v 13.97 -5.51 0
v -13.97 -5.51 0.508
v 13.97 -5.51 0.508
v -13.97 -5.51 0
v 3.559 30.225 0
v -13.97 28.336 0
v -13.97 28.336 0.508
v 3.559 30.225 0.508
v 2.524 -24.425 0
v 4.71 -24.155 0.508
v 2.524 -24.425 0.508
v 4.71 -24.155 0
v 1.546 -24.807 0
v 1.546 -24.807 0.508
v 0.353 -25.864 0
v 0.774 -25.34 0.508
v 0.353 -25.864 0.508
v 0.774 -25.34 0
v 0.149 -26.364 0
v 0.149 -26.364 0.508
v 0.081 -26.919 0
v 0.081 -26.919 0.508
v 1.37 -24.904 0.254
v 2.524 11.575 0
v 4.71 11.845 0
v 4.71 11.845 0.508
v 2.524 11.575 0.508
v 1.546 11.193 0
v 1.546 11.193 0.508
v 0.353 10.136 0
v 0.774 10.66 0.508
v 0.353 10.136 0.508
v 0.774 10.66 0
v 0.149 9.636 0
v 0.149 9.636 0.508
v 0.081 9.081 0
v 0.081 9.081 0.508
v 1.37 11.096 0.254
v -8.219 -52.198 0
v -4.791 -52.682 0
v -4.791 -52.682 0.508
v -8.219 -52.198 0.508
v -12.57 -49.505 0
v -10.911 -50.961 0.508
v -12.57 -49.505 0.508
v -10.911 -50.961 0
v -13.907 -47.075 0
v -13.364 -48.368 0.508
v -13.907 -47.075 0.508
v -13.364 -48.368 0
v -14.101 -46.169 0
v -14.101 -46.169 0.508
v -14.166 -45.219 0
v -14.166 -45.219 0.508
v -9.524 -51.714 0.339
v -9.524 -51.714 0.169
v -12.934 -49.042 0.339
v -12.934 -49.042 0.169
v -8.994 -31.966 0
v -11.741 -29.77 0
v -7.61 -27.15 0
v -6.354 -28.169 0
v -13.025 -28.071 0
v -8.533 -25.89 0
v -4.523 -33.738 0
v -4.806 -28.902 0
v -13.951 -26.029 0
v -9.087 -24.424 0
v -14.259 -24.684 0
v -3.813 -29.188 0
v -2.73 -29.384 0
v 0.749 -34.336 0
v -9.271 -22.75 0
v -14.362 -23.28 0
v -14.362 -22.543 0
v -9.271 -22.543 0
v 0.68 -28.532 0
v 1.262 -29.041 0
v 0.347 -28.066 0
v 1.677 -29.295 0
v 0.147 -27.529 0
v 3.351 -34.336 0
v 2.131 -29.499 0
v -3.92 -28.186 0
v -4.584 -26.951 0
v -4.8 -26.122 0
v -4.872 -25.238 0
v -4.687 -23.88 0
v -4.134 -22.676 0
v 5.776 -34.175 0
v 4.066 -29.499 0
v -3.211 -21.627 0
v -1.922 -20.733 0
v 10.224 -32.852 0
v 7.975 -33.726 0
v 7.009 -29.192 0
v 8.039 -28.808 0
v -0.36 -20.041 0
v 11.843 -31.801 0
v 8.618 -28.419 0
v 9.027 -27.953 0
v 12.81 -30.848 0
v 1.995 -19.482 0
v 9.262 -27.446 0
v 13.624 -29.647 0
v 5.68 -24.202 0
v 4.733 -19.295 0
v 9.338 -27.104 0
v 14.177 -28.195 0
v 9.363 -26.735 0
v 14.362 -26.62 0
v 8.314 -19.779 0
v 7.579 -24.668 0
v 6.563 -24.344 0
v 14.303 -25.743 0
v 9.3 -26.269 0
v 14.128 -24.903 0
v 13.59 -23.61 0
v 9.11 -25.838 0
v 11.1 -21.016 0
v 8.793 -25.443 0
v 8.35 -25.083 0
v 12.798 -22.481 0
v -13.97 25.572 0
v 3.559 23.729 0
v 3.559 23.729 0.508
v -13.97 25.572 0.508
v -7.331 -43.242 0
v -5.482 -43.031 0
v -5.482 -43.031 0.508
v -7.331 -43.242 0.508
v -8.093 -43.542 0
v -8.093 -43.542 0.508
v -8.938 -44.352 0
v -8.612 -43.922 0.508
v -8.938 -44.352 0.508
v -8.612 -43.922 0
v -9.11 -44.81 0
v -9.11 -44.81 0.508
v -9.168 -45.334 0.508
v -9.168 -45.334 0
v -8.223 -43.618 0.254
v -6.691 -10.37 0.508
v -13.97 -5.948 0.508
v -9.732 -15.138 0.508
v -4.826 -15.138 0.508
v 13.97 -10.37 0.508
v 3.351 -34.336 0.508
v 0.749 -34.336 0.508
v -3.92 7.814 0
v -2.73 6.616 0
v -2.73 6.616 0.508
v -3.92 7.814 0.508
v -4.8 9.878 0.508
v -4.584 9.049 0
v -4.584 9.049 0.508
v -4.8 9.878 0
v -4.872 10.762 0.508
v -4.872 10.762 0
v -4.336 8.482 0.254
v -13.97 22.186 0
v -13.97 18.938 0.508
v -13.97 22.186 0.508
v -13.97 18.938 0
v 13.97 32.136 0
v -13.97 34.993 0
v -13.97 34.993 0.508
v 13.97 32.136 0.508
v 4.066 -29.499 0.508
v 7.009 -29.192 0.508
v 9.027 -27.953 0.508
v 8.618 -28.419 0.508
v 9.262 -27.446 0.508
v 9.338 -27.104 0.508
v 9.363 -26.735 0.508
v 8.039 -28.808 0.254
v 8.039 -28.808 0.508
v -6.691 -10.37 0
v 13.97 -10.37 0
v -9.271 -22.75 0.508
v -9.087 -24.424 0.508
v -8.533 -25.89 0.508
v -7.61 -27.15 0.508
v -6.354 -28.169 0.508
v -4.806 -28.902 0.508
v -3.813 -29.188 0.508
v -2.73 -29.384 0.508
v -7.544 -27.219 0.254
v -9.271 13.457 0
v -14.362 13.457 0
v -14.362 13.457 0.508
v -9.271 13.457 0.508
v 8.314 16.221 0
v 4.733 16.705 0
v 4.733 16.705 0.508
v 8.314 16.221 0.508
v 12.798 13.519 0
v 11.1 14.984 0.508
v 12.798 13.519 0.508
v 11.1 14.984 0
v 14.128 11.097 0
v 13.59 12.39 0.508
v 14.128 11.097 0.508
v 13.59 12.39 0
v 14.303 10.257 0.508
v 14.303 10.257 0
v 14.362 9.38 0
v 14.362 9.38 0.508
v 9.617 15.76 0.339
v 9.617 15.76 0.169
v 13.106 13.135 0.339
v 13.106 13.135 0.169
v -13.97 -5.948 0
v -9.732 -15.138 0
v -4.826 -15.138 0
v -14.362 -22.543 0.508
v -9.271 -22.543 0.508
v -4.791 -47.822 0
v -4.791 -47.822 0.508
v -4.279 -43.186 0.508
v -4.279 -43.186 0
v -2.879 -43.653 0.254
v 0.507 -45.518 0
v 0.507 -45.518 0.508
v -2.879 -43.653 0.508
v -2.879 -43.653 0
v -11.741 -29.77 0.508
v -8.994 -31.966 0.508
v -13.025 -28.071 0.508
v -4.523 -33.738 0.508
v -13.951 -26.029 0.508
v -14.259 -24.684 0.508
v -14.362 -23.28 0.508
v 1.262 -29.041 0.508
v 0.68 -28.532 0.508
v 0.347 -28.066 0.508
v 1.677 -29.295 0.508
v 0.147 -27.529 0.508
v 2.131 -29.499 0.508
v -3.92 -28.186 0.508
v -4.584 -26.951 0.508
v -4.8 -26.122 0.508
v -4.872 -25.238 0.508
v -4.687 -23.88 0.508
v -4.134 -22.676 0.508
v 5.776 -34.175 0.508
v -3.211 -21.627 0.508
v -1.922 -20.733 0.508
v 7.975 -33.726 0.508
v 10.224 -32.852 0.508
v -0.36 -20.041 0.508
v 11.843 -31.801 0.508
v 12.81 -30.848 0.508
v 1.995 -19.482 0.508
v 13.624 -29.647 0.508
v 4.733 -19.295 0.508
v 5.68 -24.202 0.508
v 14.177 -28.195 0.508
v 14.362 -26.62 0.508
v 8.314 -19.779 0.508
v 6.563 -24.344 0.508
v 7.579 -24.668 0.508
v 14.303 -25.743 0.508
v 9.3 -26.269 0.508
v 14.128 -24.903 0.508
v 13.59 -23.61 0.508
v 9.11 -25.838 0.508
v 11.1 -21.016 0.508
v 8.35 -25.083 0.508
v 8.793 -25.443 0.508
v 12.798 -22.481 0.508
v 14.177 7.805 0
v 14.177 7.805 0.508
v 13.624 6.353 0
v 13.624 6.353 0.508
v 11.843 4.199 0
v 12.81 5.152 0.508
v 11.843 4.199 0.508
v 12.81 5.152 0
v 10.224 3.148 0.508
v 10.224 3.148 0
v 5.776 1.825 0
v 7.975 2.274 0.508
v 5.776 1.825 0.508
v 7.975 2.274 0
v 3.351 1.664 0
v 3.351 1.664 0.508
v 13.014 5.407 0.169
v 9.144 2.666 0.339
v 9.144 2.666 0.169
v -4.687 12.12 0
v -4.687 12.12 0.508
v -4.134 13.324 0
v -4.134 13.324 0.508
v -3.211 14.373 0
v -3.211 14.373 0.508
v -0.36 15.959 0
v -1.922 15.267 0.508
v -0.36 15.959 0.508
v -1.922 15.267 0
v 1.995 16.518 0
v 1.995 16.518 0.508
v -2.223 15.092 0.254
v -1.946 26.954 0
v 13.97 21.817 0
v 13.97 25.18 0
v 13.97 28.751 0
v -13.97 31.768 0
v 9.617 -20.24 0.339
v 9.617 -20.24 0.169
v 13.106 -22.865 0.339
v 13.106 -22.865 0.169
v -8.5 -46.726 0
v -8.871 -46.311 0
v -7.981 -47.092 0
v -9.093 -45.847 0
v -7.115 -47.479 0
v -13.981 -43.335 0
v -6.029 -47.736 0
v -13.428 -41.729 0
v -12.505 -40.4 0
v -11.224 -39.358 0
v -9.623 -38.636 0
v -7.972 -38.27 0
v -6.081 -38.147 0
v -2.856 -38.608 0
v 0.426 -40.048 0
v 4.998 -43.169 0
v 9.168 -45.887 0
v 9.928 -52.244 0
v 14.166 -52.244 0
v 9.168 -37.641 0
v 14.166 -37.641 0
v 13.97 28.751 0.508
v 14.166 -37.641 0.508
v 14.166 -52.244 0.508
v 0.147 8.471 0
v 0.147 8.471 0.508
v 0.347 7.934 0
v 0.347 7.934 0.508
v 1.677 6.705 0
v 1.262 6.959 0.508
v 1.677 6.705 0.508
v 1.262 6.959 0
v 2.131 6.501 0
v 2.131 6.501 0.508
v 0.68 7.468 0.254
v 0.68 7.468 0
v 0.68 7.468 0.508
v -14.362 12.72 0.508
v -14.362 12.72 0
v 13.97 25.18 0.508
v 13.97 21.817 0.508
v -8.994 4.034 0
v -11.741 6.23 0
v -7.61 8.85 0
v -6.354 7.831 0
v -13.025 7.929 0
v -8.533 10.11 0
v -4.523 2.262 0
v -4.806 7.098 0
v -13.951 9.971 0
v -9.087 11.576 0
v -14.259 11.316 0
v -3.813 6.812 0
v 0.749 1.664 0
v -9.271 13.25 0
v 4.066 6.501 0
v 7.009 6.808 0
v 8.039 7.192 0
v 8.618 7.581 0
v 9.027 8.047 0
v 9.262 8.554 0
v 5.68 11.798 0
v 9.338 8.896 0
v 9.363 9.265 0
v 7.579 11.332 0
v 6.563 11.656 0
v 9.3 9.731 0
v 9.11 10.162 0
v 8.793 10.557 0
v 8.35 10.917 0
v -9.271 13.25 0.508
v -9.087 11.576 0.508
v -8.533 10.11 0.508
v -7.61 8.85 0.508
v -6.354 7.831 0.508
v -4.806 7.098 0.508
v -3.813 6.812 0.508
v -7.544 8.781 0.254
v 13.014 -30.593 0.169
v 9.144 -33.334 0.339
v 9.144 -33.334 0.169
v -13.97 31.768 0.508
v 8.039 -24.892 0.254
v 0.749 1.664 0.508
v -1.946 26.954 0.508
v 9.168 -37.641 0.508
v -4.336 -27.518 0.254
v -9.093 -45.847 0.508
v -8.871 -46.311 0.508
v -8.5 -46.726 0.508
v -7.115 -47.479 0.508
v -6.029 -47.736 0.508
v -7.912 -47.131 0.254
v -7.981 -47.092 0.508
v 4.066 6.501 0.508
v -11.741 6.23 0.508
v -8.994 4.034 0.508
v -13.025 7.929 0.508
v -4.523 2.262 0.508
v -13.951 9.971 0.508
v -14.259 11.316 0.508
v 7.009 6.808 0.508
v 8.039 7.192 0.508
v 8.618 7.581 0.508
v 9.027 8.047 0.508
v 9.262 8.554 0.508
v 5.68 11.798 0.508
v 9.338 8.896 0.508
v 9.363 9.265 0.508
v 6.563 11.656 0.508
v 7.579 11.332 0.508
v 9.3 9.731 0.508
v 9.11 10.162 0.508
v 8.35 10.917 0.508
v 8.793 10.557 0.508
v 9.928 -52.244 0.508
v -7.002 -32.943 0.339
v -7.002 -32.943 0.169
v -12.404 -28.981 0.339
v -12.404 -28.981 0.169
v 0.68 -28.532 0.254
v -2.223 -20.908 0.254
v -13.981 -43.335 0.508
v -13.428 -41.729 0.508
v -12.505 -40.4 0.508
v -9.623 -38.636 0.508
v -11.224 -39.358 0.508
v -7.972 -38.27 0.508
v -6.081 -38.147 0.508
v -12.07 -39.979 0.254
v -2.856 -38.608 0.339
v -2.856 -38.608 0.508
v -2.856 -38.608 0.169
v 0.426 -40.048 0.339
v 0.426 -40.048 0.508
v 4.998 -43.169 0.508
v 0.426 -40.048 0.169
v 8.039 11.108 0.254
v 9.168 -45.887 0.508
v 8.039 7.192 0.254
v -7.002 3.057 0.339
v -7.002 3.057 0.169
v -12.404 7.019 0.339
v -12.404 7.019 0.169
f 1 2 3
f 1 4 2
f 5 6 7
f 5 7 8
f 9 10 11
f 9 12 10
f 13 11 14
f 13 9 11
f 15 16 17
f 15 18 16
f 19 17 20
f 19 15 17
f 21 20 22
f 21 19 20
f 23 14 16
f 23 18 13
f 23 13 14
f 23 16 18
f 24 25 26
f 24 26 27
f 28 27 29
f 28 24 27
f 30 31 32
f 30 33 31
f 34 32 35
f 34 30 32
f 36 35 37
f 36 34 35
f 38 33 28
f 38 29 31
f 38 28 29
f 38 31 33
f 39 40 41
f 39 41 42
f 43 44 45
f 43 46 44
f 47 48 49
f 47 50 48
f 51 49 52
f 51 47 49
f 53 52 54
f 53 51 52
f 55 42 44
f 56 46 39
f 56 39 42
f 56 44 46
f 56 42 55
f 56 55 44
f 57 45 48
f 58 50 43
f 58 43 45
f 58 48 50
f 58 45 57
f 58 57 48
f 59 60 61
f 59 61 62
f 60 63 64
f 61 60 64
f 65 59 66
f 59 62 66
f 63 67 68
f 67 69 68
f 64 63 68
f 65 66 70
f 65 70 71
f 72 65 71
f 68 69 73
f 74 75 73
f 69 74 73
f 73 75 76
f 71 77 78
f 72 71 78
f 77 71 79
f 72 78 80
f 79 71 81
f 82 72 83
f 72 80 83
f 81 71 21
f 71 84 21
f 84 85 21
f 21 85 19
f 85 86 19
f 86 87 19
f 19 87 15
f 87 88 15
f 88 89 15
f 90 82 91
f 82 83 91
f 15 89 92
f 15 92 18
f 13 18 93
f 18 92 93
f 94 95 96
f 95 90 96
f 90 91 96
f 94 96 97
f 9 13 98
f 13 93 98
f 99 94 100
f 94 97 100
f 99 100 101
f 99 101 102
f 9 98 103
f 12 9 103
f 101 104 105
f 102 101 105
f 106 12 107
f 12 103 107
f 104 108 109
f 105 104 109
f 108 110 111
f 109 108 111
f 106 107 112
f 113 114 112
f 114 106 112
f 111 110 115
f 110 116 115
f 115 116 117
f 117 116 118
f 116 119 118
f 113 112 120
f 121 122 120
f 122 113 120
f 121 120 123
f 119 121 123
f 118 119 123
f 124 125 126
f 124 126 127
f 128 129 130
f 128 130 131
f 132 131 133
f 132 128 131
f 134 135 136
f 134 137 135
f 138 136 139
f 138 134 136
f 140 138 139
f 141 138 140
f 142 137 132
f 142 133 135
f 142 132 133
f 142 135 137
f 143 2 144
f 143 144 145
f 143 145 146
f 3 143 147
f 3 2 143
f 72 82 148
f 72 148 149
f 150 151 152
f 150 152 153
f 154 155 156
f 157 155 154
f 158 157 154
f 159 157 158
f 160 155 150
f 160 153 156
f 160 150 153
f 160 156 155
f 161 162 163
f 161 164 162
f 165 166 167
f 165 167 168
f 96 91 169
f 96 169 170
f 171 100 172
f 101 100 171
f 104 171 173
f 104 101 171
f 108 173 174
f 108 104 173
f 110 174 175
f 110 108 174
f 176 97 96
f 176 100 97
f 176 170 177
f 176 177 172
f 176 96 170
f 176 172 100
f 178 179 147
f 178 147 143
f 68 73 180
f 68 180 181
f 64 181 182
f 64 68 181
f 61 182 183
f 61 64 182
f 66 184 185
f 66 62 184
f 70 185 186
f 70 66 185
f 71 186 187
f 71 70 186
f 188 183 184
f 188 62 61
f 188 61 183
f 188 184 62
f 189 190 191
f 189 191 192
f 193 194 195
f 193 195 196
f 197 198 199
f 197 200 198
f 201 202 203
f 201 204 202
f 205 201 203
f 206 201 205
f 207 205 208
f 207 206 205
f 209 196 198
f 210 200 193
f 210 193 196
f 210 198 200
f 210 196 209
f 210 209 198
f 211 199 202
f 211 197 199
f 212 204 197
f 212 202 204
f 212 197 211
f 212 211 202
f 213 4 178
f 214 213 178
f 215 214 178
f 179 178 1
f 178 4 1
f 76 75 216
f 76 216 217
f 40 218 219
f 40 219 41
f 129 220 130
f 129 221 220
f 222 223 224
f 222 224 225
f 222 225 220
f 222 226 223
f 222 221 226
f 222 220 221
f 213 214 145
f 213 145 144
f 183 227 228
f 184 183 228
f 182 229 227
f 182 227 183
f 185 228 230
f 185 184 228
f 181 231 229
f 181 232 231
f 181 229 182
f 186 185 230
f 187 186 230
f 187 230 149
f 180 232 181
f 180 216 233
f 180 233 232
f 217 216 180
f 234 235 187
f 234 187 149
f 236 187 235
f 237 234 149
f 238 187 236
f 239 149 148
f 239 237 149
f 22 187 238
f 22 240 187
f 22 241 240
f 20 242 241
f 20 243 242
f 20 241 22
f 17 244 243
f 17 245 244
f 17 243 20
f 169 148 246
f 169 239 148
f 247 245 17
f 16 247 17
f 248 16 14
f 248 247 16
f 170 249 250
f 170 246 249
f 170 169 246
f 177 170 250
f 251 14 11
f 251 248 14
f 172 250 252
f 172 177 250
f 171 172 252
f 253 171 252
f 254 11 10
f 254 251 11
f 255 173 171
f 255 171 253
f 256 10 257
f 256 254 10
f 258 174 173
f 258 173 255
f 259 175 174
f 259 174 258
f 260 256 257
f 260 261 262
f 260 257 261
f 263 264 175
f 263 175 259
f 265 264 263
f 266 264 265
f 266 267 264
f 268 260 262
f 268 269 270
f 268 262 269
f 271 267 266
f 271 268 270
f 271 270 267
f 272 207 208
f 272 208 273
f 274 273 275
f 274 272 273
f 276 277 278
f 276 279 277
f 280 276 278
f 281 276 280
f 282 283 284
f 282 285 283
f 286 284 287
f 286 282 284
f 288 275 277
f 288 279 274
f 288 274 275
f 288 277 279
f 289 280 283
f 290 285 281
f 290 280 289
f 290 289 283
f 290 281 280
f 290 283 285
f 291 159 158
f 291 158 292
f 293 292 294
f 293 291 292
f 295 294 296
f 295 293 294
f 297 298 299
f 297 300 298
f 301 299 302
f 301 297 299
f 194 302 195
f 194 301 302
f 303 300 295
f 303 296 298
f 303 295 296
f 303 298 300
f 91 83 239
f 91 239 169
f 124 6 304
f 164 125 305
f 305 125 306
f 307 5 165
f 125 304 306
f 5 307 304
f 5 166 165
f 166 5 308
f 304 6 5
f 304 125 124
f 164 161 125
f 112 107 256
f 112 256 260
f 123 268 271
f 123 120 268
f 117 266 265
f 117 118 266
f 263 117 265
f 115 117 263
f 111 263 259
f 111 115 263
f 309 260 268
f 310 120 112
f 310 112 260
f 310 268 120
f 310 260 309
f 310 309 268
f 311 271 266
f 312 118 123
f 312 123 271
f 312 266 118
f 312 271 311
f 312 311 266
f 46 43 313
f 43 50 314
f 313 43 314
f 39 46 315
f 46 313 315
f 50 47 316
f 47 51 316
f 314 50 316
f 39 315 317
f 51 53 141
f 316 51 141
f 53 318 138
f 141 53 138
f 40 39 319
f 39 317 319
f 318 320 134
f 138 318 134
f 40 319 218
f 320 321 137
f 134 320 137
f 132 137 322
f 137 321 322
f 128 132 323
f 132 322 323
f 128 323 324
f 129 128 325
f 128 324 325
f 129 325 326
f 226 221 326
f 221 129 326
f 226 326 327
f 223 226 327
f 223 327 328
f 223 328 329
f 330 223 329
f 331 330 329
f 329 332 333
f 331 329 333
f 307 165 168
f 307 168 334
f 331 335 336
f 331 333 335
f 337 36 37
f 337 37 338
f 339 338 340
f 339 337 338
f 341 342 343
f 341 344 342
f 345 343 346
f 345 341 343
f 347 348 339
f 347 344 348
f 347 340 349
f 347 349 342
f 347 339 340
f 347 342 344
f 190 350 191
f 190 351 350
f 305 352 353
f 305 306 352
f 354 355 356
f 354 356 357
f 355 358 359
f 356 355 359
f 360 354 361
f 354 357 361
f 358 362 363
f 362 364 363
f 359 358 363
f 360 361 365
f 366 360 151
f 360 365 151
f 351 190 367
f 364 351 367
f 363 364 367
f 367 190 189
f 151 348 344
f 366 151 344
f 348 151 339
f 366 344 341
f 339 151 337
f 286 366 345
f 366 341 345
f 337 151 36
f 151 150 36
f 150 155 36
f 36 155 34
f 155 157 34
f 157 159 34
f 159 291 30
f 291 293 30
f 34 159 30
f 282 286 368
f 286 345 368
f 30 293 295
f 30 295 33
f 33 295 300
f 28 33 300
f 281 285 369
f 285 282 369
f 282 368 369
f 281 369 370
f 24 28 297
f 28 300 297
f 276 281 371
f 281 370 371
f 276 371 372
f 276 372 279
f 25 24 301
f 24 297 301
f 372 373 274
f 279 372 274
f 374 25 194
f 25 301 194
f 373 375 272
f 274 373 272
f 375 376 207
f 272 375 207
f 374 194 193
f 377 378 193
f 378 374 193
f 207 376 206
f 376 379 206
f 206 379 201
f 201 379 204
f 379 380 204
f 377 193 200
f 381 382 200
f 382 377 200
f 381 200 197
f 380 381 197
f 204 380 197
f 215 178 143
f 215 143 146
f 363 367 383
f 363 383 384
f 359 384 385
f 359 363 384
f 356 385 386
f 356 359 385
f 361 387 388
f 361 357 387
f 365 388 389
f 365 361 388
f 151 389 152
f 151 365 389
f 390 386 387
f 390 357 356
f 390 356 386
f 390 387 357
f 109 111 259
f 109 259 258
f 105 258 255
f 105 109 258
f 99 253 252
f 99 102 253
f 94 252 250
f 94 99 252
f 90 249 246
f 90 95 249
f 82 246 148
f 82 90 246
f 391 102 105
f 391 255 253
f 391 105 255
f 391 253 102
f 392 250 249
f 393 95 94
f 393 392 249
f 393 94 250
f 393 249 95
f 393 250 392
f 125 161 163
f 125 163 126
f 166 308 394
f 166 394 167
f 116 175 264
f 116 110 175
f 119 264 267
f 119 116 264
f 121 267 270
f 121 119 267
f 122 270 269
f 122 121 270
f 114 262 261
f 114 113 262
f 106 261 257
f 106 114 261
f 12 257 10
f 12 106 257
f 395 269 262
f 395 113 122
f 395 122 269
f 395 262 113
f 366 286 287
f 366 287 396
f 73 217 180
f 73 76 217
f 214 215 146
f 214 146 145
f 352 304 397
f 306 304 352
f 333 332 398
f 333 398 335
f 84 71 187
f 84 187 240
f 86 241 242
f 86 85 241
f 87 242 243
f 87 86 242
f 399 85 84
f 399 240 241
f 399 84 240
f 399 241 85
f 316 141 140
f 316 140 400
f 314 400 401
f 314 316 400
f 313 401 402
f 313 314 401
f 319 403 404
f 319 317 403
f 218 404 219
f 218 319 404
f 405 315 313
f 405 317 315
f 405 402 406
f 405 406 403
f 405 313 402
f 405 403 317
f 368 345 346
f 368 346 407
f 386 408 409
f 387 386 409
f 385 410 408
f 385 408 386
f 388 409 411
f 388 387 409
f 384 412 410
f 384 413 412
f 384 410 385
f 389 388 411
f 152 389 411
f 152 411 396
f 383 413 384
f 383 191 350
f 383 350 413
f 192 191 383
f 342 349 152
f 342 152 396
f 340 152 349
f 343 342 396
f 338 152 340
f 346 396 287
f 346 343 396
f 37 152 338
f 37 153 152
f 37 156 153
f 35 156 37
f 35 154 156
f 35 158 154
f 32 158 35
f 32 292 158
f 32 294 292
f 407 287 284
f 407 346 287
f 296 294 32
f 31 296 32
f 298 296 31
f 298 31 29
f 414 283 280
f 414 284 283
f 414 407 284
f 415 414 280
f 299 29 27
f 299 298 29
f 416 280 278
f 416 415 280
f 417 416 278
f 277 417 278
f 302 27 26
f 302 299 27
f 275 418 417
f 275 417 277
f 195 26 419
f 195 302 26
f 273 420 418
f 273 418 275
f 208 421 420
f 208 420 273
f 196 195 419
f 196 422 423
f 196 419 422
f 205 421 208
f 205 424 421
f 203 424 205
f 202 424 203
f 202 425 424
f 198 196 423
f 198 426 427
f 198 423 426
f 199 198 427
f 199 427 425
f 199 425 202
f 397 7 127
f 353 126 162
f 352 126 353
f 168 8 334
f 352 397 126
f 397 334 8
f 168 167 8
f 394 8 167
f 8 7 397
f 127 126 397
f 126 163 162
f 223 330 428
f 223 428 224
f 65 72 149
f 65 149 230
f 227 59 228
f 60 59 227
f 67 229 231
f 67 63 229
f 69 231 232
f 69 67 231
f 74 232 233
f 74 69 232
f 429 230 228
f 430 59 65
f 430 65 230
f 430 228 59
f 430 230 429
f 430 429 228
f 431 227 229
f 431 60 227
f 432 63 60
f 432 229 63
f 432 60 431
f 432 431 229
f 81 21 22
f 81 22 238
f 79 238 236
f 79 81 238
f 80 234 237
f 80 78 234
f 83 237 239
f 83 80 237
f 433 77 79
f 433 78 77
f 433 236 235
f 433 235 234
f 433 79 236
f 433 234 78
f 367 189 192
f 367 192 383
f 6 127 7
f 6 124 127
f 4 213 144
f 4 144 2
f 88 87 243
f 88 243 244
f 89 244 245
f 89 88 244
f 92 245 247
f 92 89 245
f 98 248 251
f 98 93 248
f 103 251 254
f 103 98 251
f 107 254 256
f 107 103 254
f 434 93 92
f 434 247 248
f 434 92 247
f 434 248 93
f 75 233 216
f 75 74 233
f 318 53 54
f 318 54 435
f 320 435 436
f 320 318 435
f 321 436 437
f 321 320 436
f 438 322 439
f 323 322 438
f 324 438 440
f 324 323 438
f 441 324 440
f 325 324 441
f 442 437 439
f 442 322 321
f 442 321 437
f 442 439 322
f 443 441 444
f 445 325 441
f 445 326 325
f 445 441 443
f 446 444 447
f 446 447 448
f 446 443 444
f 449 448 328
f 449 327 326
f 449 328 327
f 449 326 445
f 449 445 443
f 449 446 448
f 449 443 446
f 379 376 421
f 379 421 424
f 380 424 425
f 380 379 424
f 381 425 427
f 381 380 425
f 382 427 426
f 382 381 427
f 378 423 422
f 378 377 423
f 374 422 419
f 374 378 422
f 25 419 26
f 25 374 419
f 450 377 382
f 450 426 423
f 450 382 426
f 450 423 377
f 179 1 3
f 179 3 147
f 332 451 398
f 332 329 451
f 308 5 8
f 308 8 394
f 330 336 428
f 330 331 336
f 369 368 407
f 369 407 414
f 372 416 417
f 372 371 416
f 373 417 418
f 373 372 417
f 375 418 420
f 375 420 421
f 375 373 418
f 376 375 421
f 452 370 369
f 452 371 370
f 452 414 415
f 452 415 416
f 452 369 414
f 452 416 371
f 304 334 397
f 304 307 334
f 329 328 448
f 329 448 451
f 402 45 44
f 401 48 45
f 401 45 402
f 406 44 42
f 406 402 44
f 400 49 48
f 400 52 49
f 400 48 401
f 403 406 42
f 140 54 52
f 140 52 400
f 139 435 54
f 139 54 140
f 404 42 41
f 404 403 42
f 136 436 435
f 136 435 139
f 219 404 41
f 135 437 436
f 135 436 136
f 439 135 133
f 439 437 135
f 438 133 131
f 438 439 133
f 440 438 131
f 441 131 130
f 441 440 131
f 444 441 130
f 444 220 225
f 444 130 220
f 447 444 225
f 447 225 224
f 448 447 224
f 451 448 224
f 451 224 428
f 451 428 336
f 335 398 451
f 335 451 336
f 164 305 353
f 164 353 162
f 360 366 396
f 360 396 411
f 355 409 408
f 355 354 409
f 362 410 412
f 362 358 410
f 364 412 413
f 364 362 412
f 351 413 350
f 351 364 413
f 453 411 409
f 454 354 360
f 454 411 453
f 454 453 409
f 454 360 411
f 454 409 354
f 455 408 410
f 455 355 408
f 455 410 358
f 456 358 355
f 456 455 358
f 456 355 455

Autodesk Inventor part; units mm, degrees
ref_plane "YZ Plane" through (0, 0, 0) normal (1, 0, 0) x (0, 1, 0)
ref_plane "XZ Plane" through (0, 0, 0) normal (0, 1, 0) x (-1, 0, 0)
ref_plane "XY Plane" through (0, 0, 0) normal (0, 0, 1) x (1, 0, 0)
sketch "Sketch1" plane through (0, 0, 0) normal (0, 0, 1) x (1, 0, 0)
  line L0 (-16, -36.75) -> (-16, -53.25) construction
  line L1 (-16, -53.25) -> (16, -53.25) construction
  line L2 (16, -53.25) -> (16, -36.75) construction
  line L3 (16, -36.75) -> (-16, -36.75) construction
  line L4 (-16, -18.75) -> (-16, -35.25) construction
  line L5 (-16, -35.25) -> (16, -35.25) construction
  line L6 (16, -35.25) -> (16, -18.75) construction
  line L7 (16, -18.75) -> (-16, -18.75) construction
  line L8 (-16, -0.75) -> (-16, -17.25) construction
  line L9 (-16, -17.25) -> (16, -17.25) construction
  line L10 (16, -17.25) -> (16, -0.75) construction
  line L11 (16, -0.75) -> (-16, -0.75) construction
  line L12 (-16, 17.25) -> (-16, 0.75) construction
  line L13 (-16, 0.75) -> (16, 0.75) construction
  line L14 (16, 0.75) -> (16, 17.25) construction
  line L15 (16, 17.25) -> (-16, 17.25) construction
  line L16 (-16, 35.25) -> (-16, 18.75) construction
  line L17 (-16, 18.75) -> (16, 18.75) construction
  line L18 (16, 18.75) -> (16, 35.25) construction
  line L19 (16, 35.25) -> (-16, 35.25) construction
  line L20 (-16, -35.25) -> (-16, -18.75) construction
  line L21 (-16, -18.75) -> (16, -18.75) construction
  line L22 (16, -18.75) -> (16, -35.25) construction
  line L23 (16, -35.25) -> (-16, -35.25) construction
  line L24 (-16, -17.25) -> (-16, -0.75) construction
  line L25 (-16, -0.75) -> (16, -0.75) construction
  line L26 (16, -0.75) -> (16, -17.25) construction
  line L27 (16, -17.25) -> (-16, -17.25) construction
  line L28 (-16, -53.25) -> (-16, -36.75) construction
  line L29 (-16, -36.75) -> (16, -36.75) construction
  line L30 (16, -36.75) -> (16, -53.25) construction
  line L31 (16, -53.25) -> (-16, -53.25) construction
  line L32 (16, 0.75) -> (-16, 0.75) construction
  line L33 (-16, 0.75) -> (-16, 17.25) construction
  line L34 (-16, 17.25) -> (16, 17.25) construction
  line L35 (16, 17.25) -> (16, 0.75) construction
  line L36 (16, 18.75) -> (-16, 18.75) construction
  line L37 (-16, 18.75) -> (-16, 35.25) construction
  line L38 (-16, 35.25) -> (16, 35.25) construction
  line L39 (16, 35.25) -> (16, 18.75) construction
  line L40 (14.1658, -37.6407) -> (14.1658, -52.2441)
  line L41 (14.1658, -52.2441) -> (9.9276, -52.2441)
  line L42 (9.9276, -52.2441) -> (0.5067, -45.5183)
  spline S0 degree 2 poles (0.5067, -45.5183) (-3.2708, -43.0306) (-5.482, -43.0306) knots 0 0 0 1 1 1
  spline S1 degree 2 poles (-5.482, -43.0306) (-7.2787, -43.0306) (-9.1675, -44.2053) (-9.1675, -45.334) knots 0 0 0 1 2 2 2
  spline S2 degree 2 poles (-9.1675, -45.334) (-9.1675, -46.4396) (-6.6568, -47.8216) (-4.791, -47.8216) knots 0 0 0 1 2 2 2
  line L43 (-4.791, -47.8216) -> (-4.791, -52.6818)
  spline S3 degree 2 poles (-4.791, -52.6818) (-7.3478, -52.6818) (-11.7012, -50.7469) (-14.1658, -47.3379) (-14.1658, -45.2188) knots 0 0 0 1 2 3 3 3
  spline S4 degree 2 poles (-14.1658, -45.2188) (-14.1658, -41.8098) (-9.9736, -38.1474) (-6.0809, -38.1474) knots 0 0 0 1 2 2 2
  spline S5 degree 2 poles (-6.0809, -38.1474) (-4.4225, -38.1474) (-1.2899, -39.0688) (2.1421, -41.0267) (4.9983, -43.1688) knots 0 0 0 1 2 3 3 3
  line L44 (4.9983, -43.1688) -> (9.1675, -45.8868)
  line L45 (9.1675, -45.8868) -> (9.1675, -37.6407)
  line L46 (9.1675, -37.6407) -> (14.1658, -37.6407)
  line L47 (-14.3616, -22.543) -> (-9.2711, -22.543)
  line L48 (-9.2711, -22.543) -> (-9.2711, -22.7503)
  spline S6 degree 2 poles (-9.2711, -22.7503) (-9.2711, -25.4683) (-5.816, -28.9694) (-2.7295, -29.384) knots 0 0 0 1 2 2 2
  spline S7 degree 2 poles (-2.7295, -29.384) (-4.8716, -27.7256) (-4.8716, -25.2379) knots 0 0 0 1 1 1
  spline S8 degree 2 poles (-4.8716, -25.2379) (-4.8716, -22.5199) (0.4261, -19.2952) (4.7334, -19.2952) knots 0 0 0 1 2 2 2
  spline S9 degree 2 poles (4.7334, -19.2952) (7.3823, -19.2952) (11.8509, -21.184) (14.3616, -24.5469) (14.3616, -26.6199) knots 0 0 0 1 2 3 3 3
  spline S10 degree 2 poles (14.3616, -26.6199) (14.3616, -28.8312) (11.6666, -32.3554) (6.6222, -34.3132) (3.3514, -34.3363) knots 0 0 0 1 2 3 3 3
  line L49 (3.3514, -34.3363) -> (0.7486, -34.3363)
  spline S11 degree 2 poles (0.7486, -34.3363) (-3.5587, -34.3363) (-10.4458, -31.5492) (-14.3616, -26.4126) (-14.3616, -23.28) knots 0 0 0 1 2 3 3 3
  line L50 (-14.3616, -23.28) -> (-14.3616, -22.543)
  spline S12 degree 2 poles (0.0806, -26.9194) (0.0806, -27.8868) (1.2784, -29.1767) (2.1306, -29.4992) knots 0 0 0 1 2 2 2
  line L51 (2.1306, -29.4992) -> (4.0655, -29.4992)
  spline S13 degree 2 poles (4.0655, -29.4992) (9.3632, -29.4992) (9.3632, -26.7351) knots 0 0 0 1 1 1
  spline S14 degree 2 poles (9.3632, -26.7351) (9.3632, -25.6295) (6.7144, -24.1553) (4.7104, -24.1553) knots 0 0 0 1 2 2 2
  spline S15 degree 2 poles (4.7104, -24.1553) (2.6604, -24.1553) (0.0806, -25.6525) (0.0806, -26.9194) knots 0 0 0 1 2 2 2
  line L52 (13.97, -5.5104) -> (13.97, -10.3705)
  line L53 (13.97, -10.3705) -> (-6.6913, -10.3705)
  line L54 (-6.6913, -10.3705) -> (-4.8256, -15.1385)
  line L55 (-4.8256, -15.1385) -> (-9.7318, -15.1385)
  line L56 (-9.7318, -15.1385) -> (-13.97, -5.948)
  line L57 (-13.97, -5.948) -> (-13.97, -5.5104)
  line L58 (-13.97, -5.5104) -> (13.97, -5.5104)
  line L59 (-14.3616, 13.457) -> (-9.2711, 13.457)
  line L60 (-9.2711, 13.457) -> (-9.2711, 13.2497)
  spline S16 degree 2 poles (-9.2711, 13.2497) (-9.2711, 10.5317) (-5.816, 7.0306) (-2.7295, 6.616) knots 0 0 0 1 2 2 2
  spline S17 degree 2 poles (-2.7295, 6.616) (-4.8716, 8.2744) (-4.8716, 10.7621) knots 0 0 0 1 1 1
  spline S18 degree 2 poles (-4.8716, 10.7621) (-4.8716, 13.4801) (0.4261, 16.7048) (4.7334, 16.7048) knots 0 0 0 1 2 2 2
  spline S19 degree 2 poles (4.7334, 16.7048) (7.3823, 16.7048) (11.8509, 14.816) (14.3616, 11.4531) (14.3616, 9.3801) knots 0 0 0 1 2 3 3 3
  spline S20 degree 2 poles (14.3616, 9.3801) (14.3616, 7.1688) (11.6666, 3.6446) (6.6222, 1.6868) (3.3514, 1.6637) knots 0 0 0 1 2 3 3 3
  line L61 (3.3514, 1.6637) -> (0.7486, 1.6637)
  spline S21 degree 2 poles (0.7486, 1.6637) (-3.5587, 1.6637) (-10.4458, 4.4508) (-14.3616, 9.5874) (-14.3616, 12.72) knots 0 0 0 1 2 3 3 3
  line L62 (-14.3616, 12.72) -> (-14.3616, 13.457)
  spline S22 degree 2 poles (0.0806, 9.0806) (0.0806, 8.1132) (1.2784, 6.8233) (2.1306, 6.5008) knots 0 0 0 1 2 2 2
  line L63 (2.1306, 6.5008) -> (4.0655, 6.5008)
  spline S23 degree 2 poles (4.0655, 6.5008) (9.3632, 6.5008) (9.3632, 9.2649) knots 0 0 0 1 1 1
  spline S24 degree 2 poles (9.3632, 9.2649) (9.3632, 10.3705) (6.7144, 11.8447) (4.7104, 11.8447) knots 0 0 0 1 2 2 2
  spline S25 degree 2 poles (4.7104, 11.8447) (2.6604, 11.8447) (0.0806, 10.3475) (0.0806, 9.0806) knots 0 0 0 1 2 2 2
  line L64 (3.5587, 30.2247) -> (-13.97, 31.768)
  line L65 (-13.97, 31.768) -> (-13.97, 34.9927)
  line L66 (-13.97, 34.9927) -> (13.97, 32.1365)
  line L67 (13.97, 32.1365) -> (13.97, 28.7506)
  line L68 (13.97, 28.7506) -> (-1.9464, 26.9539)
  line L69 (-1.9464, 26.9539) -> (13.97, 25.1803)
  line L70 (13.97, 25.1803) -> (13.97, 21.8174)
  line L71 (13.97, 21.8174) -> (-13.97, 18.9382)
  line L72 (-13.97, 18.9382) -> (-13.97, 22.1859)
  line L73 (-13.97, 22.1859) -> (3.5587, 23.7292)
  line L74 (3.5587, 23.7292) -> (-13.97, 25.5719)
  line L75 (-13.97, 25.5719) -> (-13.97, 28.336)
  line L76 (-13.97, 28.336) -> (3.5587, 30.2247)
  point P0 (0, 0)
extrude "Extrusion1" add sketch "Sketch1" along normal blind 0.508
properties part number "Licence plate numbers"
